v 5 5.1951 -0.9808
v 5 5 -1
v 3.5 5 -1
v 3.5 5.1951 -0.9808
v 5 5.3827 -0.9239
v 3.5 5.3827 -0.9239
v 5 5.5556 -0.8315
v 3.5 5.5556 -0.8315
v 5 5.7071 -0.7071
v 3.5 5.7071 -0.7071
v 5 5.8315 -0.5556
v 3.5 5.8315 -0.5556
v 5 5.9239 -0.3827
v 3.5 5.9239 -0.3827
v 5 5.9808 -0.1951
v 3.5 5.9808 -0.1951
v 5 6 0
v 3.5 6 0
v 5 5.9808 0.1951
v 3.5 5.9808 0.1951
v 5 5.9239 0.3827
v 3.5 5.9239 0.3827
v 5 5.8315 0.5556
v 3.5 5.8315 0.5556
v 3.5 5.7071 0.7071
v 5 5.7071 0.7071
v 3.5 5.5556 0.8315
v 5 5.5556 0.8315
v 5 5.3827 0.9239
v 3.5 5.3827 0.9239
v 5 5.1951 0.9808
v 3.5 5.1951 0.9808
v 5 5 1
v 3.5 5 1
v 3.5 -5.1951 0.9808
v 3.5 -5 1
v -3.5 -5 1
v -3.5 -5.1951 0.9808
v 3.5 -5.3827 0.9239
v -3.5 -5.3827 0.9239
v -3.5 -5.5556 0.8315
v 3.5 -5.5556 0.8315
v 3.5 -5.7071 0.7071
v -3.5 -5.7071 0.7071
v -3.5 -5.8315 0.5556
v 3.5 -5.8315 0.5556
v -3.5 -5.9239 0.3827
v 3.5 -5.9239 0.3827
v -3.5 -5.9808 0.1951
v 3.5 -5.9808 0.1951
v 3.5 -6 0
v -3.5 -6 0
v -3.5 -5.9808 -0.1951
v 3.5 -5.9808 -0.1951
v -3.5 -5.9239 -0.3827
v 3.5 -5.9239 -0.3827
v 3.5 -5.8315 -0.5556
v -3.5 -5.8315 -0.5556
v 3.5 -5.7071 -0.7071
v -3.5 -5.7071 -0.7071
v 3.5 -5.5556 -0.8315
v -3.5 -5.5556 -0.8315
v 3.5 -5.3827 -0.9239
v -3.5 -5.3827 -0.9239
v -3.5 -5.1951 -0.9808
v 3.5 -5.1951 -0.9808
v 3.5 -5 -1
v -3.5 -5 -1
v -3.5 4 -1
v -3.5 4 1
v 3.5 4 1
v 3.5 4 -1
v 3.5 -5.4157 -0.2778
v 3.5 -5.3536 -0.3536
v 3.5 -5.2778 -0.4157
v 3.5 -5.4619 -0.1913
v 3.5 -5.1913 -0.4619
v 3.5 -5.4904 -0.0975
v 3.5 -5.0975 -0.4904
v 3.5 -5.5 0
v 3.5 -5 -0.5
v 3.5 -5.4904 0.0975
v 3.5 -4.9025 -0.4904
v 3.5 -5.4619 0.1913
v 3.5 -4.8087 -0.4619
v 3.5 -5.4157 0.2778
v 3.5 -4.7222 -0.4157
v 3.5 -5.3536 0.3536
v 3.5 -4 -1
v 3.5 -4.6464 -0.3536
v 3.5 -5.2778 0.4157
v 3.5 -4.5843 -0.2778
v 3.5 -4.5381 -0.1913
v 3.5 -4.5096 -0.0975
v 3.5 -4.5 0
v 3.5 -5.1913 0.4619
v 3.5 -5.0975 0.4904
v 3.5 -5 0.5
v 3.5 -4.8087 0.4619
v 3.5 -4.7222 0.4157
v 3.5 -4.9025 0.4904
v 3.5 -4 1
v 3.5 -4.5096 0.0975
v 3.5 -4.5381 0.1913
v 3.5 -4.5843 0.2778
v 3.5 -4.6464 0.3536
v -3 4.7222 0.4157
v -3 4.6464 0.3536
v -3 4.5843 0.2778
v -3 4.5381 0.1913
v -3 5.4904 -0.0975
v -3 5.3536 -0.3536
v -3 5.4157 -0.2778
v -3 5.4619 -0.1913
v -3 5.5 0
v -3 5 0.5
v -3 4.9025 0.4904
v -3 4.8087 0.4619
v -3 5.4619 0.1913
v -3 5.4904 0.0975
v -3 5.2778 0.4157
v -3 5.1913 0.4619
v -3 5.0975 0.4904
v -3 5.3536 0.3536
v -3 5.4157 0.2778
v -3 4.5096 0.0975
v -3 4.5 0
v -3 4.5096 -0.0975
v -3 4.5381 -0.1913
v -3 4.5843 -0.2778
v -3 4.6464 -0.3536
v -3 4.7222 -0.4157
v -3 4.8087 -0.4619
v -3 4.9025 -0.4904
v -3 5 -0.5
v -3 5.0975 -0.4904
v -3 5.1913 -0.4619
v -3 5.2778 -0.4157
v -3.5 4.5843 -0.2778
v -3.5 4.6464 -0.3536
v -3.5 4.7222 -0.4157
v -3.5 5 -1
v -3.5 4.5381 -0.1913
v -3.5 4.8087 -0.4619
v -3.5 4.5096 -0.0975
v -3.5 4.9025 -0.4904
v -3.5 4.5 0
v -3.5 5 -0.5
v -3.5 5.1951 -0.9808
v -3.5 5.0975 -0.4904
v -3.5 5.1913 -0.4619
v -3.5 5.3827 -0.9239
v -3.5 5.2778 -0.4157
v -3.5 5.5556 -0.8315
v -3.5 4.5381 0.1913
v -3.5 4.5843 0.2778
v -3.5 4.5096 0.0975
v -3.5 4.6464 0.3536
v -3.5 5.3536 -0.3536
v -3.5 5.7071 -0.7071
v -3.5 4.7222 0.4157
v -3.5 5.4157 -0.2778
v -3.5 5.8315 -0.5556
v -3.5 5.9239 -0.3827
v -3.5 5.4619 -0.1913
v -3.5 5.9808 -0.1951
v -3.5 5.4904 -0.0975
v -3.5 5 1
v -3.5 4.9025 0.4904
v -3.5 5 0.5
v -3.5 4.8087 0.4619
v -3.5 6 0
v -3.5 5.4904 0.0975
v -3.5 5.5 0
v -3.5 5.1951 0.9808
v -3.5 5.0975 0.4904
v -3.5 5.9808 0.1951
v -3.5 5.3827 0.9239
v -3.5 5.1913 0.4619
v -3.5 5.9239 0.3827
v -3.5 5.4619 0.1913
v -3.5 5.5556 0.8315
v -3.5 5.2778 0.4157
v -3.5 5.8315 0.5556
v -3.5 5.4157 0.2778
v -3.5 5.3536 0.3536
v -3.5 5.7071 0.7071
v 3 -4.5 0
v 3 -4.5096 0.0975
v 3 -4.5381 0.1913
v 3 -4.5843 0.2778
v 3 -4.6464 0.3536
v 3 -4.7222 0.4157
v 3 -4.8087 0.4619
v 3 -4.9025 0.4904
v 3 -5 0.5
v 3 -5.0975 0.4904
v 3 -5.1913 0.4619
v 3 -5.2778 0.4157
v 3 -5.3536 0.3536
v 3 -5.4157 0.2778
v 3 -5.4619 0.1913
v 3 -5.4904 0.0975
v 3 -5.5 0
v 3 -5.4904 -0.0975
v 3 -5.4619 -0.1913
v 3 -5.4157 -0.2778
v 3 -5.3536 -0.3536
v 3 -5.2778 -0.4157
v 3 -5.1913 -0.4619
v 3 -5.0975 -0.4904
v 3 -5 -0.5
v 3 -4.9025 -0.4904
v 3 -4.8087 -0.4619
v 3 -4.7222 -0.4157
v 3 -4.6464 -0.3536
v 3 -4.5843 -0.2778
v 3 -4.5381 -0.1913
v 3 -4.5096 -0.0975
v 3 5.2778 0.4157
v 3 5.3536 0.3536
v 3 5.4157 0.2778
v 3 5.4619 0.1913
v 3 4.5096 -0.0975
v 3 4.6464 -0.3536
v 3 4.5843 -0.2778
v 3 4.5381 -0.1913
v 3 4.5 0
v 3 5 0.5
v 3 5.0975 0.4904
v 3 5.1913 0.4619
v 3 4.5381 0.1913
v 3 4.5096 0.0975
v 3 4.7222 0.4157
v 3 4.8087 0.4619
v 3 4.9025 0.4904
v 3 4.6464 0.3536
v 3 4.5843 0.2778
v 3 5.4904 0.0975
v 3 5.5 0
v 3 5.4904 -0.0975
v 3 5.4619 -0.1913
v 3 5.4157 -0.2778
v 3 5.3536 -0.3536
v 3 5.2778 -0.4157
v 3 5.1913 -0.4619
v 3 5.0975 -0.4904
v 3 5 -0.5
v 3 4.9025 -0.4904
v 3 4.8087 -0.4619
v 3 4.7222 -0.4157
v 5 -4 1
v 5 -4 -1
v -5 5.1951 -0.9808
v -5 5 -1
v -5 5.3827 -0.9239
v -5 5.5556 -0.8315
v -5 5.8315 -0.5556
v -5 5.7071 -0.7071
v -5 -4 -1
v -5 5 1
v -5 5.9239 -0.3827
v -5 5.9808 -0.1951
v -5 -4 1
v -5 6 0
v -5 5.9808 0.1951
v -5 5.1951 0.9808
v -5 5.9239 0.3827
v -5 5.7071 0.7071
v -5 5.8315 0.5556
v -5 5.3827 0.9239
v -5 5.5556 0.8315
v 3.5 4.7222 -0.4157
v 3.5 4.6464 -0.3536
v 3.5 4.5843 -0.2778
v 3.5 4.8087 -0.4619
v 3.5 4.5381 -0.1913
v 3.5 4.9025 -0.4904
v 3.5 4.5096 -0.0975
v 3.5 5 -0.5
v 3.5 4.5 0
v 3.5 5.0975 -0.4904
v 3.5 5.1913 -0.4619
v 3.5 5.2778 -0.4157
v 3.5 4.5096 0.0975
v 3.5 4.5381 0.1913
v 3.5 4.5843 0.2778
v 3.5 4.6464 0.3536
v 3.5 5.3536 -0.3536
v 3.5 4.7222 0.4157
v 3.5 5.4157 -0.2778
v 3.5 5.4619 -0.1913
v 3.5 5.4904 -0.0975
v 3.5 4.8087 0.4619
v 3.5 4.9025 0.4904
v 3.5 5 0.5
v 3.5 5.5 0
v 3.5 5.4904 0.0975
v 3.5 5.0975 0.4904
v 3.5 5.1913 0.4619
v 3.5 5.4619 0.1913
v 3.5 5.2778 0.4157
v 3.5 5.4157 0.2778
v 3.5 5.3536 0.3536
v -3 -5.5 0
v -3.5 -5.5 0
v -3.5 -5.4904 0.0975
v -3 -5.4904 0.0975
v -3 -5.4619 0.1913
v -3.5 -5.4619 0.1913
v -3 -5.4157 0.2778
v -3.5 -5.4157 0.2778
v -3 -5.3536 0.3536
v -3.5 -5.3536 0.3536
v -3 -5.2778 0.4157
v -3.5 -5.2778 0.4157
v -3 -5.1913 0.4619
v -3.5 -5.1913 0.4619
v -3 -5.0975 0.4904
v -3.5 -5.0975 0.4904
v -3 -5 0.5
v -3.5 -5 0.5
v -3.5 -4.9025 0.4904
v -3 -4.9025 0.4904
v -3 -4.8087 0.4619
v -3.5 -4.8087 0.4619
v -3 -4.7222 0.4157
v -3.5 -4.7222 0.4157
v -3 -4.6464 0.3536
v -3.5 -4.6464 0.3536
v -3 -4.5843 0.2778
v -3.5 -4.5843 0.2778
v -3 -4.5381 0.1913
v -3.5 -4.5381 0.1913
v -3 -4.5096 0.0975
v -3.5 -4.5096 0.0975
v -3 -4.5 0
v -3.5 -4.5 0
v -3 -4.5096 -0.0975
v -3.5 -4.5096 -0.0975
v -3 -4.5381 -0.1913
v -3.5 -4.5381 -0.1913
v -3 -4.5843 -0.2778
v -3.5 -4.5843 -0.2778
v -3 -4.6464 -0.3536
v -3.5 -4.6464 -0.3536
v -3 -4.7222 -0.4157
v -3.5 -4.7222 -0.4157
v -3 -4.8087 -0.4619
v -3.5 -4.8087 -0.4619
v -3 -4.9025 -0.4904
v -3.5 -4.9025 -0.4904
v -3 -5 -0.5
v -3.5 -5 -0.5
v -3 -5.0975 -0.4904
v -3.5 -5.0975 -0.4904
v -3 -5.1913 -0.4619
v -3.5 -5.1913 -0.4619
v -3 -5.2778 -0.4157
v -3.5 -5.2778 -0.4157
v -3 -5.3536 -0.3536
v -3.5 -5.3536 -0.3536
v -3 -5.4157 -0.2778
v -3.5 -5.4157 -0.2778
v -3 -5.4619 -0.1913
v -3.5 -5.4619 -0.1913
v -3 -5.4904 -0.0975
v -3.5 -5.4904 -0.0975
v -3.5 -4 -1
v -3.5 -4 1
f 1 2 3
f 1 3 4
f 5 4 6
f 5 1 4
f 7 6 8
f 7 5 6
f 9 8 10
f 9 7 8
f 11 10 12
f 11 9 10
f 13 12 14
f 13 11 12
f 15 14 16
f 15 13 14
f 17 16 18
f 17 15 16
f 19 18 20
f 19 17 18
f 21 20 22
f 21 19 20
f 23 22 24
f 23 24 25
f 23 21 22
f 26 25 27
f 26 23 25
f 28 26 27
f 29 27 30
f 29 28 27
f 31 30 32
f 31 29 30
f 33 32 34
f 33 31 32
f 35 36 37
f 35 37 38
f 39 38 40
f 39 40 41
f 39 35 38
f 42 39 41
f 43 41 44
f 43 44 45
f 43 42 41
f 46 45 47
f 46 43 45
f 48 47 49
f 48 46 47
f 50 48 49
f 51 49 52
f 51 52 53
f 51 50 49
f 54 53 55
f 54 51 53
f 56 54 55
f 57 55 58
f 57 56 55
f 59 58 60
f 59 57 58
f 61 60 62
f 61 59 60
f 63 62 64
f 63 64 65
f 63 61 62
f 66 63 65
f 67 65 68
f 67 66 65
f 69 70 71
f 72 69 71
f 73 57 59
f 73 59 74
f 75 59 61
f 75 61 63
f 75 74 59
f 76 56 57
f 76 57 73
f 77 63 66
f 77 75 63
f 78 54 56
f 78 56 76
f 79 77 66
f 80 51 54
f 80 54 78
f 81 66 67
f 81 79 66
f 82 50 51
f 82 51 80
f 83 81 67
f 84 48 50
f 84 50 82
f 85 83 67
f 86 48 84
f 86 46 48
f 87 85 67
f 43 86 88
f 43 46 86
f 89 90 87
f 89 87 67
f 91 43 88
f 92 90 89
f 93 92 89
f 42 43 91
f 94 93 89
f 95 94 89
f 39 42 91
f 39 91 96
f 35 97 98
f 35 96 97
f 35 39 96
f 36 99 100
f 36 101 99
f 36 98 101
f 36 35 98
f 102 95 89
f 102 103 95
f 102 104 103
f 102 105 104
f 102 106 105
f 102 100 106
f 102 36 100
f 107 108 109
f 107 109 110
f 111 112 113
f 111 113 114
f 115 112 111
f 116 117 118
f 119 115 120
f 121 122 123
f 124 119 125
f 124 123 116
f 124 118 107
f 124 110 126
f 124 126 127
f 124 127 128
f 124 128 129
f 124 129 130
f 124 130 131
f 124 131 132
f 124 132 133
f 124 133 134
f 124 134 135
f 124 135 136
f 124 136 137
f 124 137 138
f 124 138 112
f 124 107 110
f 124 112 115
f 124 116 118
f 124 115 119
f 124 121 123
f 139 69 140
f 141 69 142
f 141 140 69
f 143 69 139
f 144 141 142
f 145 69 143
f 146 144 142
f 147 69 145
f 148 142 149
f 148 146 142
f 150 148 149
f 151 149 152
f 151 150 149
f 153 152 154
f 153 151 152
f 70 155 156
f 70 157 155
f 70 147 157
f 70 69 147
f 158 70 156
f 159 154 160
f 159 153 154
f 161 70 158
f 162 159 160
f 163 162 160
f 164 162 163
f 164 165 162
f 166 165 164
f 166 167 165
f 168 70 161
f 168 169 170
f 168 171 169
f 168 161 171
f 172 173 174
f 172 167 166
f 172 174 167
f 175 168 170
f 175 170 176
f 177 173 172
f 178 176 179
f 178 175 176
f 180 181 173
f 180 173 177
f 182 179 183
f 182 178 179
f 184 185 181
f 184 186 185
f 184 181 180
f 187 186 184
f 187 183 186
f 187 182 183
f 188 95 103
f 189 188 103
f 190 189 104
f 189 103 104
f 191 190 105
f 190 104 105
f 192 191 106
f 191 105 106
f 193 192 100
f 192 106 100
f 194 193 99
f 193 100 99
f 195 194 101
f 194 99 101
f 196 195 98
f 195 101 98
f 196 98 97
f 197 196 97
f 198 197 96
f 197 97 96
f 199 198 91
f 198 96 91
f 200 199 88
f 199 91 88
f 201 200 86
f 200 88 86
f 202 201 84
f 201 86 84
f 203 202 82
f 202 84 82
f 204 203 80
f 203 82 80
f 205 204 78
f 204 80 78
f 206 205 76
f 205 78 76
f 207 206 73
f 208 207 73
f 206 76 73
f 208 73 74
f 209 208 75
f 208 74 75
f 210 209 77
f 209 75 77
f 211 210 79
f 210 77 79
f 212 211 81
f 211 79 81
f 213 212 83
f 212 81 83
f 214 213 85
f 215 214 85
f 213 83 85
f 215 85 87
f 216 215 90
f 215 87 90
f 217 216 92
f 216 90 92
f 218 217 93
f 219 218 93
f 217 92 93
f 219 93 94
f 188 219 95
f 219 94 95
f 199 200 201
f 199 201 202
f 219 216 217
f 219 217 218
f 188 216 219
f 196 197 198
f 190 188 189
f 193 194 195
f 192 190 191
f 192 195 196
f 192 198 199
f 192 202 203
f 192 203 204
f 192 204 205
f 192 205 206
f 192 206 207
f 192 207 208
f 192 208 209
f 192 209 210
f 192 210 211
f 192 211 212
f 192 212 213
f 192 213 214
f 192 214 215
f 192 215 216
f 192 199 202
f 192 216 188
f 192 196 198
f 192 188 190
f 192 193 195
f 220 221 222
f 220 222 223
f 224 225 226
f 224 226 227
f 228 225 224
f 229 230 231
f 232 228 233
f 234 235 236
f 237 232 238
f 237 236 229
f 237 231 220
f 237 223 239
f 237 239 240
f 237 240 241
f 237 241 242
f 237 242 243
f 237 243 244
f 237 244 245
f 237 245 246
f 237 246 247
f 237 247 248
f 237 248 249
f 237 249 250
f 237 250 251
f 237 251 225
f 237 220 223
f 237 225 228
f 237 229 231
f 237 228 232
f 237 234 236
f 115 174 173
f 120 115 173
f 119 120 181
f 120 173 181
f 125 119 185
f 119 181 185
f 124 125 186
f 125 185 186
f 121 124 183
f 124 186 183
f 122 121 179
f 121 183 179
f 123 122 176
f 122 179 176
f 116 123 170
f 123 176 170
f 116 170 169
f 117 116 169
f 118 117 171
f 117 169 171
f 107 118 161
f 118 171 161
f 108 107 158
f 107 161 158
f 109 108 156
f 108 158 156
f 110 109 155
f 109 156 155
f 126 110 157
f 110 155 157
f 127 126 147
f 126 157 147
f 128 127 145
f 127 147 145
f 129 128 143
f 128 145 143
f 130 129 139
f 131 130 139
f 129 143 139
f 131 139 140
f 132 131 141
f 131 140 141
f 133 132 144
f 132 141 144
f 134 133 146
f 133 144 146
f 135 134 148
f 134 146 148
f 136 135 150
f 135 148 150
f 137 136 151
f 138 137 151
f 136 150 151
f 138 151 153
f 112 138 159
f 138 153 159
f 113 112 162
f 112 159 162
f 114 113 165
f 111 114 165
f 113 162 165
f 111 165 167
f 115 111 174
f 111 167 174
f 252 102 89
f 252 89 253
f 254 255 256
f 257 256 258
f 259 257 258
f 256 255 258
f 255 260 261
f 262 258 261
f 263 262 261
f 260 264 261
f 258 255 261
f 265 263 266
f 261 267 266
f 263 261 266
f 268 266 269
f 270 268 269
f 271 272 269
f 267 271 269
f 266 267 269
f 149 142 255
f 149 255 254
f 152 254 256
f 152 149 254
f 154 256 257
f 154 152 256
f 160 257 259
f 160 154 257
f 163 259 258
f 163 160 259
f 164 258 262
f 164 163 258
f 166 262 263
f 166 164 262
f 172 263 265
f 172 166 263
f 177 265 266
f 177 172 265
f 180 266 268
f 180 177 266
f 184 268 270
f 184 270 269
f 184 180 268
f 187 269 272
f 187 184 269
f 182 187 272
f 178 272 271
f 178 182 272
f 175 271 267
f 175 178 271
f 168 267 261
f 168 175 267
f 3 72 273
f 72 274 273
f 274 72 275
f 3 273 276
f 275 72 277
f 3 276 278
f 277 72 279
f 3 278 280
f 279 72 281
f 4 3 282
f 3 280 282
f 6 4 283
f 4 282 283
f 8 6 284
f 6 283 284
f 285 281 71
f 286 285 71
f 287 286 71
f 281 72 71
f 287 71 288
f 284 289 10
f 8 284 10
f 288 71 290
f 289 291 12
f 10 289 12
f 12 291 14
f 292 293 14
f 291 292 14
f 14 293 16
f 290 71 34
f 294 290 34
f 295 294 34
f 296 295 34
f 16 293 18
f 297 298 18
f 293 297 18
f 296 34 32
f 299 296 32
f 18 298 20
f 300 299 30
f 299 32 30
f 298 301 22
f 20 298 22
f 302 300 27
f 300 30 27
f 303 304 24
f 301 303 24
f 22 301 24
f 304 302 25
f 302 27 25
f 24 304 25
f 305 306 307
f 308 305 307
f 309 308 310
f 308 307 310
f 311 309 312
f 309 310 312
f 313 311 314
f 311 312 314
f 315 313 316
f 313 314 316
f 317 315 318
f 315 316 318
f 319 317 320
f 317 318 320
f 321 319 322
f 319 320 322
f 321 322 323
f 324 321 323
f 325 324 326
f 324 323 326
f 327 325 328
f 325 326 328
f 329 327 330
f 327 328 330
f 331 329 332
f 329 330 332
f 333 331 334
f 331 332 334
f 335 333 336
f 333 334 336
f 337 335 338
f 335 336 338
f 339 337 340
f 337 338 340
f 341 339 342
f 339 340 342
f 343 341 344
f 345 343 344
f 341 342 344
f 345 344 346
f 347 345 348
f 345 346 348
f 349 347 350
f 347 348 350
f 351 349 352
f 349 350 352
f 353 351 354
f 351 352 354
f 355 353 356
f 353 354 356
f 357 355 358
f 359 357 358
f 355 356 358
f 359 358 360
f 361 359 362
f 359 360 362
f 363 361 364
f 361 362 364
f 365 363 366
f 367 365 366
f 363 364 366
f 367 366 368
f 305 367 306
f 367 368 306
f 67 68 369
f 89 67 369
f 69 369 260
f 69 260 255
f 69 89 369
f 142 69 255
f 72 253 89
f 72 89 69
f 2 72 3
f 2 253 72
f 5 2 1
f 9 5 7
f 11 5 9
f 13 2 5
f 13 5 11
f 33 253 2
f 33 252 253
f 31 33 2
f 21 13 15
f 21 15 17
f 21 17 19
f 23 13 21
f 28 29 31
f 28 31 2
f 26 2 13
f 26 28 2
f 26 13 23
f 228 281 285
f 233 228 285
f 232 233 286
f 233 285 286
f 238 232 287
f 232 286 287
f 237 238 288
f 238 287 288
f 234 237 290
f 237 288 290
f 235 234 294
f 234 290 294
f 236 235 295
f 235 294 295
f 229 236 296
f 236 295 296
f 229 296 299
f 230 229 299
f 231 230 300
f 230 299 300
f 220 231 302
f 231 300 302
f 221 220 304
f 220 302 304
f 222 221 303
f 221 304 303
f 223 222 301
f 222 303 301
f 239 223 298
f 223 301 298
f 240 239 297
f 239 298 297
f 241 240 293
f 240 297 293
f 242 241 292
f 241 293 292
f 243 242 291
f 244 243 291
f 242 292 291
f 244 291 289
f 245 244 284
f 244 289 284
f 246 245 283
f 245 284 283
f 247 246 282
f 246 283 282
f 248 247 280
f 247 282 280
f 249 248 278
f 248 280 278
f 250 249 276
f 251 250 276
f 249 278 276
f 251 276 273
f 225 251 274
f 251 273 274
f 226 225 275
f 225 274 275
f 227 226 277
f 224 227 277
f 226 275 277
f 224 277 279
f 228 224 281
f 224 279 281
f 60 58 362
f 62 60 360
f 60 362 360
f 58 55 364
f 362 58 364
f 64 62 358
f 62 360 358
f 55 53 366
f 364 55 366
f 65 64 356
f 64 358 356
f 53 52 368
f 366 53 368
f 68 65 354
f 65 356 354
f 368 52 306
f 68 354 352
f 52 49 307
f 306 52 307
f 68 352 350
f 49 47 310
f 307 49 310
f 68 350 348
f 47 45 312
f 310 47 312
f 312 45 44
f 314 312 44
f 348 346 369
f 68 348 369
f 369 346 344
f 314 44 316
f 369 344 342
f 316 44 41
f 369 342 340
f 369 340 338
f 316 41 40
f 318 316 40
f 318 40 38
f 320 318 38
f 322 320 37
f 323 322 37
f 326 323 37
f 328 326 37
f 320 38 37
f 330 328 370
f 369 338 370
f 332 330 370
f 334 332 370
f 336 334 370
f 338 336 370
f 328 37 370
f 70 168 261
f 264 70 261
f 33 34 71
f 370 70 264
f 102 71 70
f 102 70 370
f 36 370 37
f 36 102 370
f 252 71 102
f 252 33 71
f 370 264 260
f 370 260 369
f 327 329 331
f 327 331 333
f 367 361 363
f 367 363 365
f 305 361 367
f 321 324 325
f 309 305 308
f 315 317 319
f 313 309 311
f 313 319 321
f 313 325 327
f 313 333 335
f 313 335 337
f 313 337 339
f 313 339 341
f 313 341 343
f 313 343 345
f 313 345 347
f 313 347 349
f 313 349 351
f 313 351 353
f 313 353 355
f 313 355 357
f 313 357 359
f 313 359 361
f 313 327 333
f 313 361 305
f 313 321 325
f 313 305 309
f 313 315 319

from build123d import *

# Parameters (mm, degrees)
F1_DEPTH  = 5
F2_W      = 7
F2_H      = 2.1077826433
F2_W_2    = 1.5
F2_H_2    = 2.502781529
F2_H_3    = 3.0992894471
F3_DEPTH  = 5
F4_R      = 0.5
F5_DEPTH  = 0.5
F6_R      = 0.5
F7_DEPTH  = 0.5
F8_R      = 0.5
F9_DEPTH  = 0.5
F10_R     = 0.5
F11_DEPTH = 0.5


with BuildPart() as f1:
    # F0 (on Right) → F1 (new body, symmetric)
    with BuildSketch(Plane.YZ):
        with BuildLine():
            ThreePointArc((5, -1), (6, 0), (5, 1))
            Line((5, 1), (-5, 1))
            ThreePointArc((-5, 1), (-6, 0), (-5, -1))
            Line((-5, -1), (5, -1))
        make_face()
    extrude(amount=F1_DEPTH, both=True)

    # F2 (on face) → F3 (cut)
    with BuildSketch(Plane.XY.offset(1)):
        with Locations((0, 5.0538913216)):
            Rectangle(F2_W, F2_H)
        with Locations((-4.25, -5.2513907645)):
            Rectangle(F2_W_2, F2_H_2)
        with Locations((4.25, -5.5496447235)):
            Rectangle(F2_W_2, F2_H_3)
    extrude(amount=-F3_DEPTH, mode=Mode.SUBTRACT)

    # F4 (on face) → F5 (cut)
    with BuildSketch(Plane(origin=(-3.5, 0, 0), x_dir=(0, -1, 0), z_dir=(-1, 0, 0))):
        with Locations((5, 0)):
            Circle(F4_R)
    extrude(amount=-F5_DEPTH, mode=Mode.SUBTRACT)

    # F6 (on face) → F7 (cut)
    with BuildSketch(Plane.YZ.offset(3.5)):
        with Locations((-5, 0)):
            Circle(F6_R)
    extrude(amount=-F7_DEPTH, mode=Mode.SUBTRACT)

    # F8 (on face) → F9 (join)
    with BuildSketch(Plane.YZ.offset(-3.5)):
        with Locations((5, 0)):
            Circle(F8_R)
    extrude(amount=F9_DEPTH)

    # F10 (on face) → F11 (join)
    with BuildSketch(Plane(origin=(3.5, 0, 0), x_dir=(0, -1, 0), z_dir=(-1, 0, 0))):
        with Locations((-5, 0)):
            Circle(F10_R)
    extrude(amount=F11_DEPTH)


solid = f1.part
